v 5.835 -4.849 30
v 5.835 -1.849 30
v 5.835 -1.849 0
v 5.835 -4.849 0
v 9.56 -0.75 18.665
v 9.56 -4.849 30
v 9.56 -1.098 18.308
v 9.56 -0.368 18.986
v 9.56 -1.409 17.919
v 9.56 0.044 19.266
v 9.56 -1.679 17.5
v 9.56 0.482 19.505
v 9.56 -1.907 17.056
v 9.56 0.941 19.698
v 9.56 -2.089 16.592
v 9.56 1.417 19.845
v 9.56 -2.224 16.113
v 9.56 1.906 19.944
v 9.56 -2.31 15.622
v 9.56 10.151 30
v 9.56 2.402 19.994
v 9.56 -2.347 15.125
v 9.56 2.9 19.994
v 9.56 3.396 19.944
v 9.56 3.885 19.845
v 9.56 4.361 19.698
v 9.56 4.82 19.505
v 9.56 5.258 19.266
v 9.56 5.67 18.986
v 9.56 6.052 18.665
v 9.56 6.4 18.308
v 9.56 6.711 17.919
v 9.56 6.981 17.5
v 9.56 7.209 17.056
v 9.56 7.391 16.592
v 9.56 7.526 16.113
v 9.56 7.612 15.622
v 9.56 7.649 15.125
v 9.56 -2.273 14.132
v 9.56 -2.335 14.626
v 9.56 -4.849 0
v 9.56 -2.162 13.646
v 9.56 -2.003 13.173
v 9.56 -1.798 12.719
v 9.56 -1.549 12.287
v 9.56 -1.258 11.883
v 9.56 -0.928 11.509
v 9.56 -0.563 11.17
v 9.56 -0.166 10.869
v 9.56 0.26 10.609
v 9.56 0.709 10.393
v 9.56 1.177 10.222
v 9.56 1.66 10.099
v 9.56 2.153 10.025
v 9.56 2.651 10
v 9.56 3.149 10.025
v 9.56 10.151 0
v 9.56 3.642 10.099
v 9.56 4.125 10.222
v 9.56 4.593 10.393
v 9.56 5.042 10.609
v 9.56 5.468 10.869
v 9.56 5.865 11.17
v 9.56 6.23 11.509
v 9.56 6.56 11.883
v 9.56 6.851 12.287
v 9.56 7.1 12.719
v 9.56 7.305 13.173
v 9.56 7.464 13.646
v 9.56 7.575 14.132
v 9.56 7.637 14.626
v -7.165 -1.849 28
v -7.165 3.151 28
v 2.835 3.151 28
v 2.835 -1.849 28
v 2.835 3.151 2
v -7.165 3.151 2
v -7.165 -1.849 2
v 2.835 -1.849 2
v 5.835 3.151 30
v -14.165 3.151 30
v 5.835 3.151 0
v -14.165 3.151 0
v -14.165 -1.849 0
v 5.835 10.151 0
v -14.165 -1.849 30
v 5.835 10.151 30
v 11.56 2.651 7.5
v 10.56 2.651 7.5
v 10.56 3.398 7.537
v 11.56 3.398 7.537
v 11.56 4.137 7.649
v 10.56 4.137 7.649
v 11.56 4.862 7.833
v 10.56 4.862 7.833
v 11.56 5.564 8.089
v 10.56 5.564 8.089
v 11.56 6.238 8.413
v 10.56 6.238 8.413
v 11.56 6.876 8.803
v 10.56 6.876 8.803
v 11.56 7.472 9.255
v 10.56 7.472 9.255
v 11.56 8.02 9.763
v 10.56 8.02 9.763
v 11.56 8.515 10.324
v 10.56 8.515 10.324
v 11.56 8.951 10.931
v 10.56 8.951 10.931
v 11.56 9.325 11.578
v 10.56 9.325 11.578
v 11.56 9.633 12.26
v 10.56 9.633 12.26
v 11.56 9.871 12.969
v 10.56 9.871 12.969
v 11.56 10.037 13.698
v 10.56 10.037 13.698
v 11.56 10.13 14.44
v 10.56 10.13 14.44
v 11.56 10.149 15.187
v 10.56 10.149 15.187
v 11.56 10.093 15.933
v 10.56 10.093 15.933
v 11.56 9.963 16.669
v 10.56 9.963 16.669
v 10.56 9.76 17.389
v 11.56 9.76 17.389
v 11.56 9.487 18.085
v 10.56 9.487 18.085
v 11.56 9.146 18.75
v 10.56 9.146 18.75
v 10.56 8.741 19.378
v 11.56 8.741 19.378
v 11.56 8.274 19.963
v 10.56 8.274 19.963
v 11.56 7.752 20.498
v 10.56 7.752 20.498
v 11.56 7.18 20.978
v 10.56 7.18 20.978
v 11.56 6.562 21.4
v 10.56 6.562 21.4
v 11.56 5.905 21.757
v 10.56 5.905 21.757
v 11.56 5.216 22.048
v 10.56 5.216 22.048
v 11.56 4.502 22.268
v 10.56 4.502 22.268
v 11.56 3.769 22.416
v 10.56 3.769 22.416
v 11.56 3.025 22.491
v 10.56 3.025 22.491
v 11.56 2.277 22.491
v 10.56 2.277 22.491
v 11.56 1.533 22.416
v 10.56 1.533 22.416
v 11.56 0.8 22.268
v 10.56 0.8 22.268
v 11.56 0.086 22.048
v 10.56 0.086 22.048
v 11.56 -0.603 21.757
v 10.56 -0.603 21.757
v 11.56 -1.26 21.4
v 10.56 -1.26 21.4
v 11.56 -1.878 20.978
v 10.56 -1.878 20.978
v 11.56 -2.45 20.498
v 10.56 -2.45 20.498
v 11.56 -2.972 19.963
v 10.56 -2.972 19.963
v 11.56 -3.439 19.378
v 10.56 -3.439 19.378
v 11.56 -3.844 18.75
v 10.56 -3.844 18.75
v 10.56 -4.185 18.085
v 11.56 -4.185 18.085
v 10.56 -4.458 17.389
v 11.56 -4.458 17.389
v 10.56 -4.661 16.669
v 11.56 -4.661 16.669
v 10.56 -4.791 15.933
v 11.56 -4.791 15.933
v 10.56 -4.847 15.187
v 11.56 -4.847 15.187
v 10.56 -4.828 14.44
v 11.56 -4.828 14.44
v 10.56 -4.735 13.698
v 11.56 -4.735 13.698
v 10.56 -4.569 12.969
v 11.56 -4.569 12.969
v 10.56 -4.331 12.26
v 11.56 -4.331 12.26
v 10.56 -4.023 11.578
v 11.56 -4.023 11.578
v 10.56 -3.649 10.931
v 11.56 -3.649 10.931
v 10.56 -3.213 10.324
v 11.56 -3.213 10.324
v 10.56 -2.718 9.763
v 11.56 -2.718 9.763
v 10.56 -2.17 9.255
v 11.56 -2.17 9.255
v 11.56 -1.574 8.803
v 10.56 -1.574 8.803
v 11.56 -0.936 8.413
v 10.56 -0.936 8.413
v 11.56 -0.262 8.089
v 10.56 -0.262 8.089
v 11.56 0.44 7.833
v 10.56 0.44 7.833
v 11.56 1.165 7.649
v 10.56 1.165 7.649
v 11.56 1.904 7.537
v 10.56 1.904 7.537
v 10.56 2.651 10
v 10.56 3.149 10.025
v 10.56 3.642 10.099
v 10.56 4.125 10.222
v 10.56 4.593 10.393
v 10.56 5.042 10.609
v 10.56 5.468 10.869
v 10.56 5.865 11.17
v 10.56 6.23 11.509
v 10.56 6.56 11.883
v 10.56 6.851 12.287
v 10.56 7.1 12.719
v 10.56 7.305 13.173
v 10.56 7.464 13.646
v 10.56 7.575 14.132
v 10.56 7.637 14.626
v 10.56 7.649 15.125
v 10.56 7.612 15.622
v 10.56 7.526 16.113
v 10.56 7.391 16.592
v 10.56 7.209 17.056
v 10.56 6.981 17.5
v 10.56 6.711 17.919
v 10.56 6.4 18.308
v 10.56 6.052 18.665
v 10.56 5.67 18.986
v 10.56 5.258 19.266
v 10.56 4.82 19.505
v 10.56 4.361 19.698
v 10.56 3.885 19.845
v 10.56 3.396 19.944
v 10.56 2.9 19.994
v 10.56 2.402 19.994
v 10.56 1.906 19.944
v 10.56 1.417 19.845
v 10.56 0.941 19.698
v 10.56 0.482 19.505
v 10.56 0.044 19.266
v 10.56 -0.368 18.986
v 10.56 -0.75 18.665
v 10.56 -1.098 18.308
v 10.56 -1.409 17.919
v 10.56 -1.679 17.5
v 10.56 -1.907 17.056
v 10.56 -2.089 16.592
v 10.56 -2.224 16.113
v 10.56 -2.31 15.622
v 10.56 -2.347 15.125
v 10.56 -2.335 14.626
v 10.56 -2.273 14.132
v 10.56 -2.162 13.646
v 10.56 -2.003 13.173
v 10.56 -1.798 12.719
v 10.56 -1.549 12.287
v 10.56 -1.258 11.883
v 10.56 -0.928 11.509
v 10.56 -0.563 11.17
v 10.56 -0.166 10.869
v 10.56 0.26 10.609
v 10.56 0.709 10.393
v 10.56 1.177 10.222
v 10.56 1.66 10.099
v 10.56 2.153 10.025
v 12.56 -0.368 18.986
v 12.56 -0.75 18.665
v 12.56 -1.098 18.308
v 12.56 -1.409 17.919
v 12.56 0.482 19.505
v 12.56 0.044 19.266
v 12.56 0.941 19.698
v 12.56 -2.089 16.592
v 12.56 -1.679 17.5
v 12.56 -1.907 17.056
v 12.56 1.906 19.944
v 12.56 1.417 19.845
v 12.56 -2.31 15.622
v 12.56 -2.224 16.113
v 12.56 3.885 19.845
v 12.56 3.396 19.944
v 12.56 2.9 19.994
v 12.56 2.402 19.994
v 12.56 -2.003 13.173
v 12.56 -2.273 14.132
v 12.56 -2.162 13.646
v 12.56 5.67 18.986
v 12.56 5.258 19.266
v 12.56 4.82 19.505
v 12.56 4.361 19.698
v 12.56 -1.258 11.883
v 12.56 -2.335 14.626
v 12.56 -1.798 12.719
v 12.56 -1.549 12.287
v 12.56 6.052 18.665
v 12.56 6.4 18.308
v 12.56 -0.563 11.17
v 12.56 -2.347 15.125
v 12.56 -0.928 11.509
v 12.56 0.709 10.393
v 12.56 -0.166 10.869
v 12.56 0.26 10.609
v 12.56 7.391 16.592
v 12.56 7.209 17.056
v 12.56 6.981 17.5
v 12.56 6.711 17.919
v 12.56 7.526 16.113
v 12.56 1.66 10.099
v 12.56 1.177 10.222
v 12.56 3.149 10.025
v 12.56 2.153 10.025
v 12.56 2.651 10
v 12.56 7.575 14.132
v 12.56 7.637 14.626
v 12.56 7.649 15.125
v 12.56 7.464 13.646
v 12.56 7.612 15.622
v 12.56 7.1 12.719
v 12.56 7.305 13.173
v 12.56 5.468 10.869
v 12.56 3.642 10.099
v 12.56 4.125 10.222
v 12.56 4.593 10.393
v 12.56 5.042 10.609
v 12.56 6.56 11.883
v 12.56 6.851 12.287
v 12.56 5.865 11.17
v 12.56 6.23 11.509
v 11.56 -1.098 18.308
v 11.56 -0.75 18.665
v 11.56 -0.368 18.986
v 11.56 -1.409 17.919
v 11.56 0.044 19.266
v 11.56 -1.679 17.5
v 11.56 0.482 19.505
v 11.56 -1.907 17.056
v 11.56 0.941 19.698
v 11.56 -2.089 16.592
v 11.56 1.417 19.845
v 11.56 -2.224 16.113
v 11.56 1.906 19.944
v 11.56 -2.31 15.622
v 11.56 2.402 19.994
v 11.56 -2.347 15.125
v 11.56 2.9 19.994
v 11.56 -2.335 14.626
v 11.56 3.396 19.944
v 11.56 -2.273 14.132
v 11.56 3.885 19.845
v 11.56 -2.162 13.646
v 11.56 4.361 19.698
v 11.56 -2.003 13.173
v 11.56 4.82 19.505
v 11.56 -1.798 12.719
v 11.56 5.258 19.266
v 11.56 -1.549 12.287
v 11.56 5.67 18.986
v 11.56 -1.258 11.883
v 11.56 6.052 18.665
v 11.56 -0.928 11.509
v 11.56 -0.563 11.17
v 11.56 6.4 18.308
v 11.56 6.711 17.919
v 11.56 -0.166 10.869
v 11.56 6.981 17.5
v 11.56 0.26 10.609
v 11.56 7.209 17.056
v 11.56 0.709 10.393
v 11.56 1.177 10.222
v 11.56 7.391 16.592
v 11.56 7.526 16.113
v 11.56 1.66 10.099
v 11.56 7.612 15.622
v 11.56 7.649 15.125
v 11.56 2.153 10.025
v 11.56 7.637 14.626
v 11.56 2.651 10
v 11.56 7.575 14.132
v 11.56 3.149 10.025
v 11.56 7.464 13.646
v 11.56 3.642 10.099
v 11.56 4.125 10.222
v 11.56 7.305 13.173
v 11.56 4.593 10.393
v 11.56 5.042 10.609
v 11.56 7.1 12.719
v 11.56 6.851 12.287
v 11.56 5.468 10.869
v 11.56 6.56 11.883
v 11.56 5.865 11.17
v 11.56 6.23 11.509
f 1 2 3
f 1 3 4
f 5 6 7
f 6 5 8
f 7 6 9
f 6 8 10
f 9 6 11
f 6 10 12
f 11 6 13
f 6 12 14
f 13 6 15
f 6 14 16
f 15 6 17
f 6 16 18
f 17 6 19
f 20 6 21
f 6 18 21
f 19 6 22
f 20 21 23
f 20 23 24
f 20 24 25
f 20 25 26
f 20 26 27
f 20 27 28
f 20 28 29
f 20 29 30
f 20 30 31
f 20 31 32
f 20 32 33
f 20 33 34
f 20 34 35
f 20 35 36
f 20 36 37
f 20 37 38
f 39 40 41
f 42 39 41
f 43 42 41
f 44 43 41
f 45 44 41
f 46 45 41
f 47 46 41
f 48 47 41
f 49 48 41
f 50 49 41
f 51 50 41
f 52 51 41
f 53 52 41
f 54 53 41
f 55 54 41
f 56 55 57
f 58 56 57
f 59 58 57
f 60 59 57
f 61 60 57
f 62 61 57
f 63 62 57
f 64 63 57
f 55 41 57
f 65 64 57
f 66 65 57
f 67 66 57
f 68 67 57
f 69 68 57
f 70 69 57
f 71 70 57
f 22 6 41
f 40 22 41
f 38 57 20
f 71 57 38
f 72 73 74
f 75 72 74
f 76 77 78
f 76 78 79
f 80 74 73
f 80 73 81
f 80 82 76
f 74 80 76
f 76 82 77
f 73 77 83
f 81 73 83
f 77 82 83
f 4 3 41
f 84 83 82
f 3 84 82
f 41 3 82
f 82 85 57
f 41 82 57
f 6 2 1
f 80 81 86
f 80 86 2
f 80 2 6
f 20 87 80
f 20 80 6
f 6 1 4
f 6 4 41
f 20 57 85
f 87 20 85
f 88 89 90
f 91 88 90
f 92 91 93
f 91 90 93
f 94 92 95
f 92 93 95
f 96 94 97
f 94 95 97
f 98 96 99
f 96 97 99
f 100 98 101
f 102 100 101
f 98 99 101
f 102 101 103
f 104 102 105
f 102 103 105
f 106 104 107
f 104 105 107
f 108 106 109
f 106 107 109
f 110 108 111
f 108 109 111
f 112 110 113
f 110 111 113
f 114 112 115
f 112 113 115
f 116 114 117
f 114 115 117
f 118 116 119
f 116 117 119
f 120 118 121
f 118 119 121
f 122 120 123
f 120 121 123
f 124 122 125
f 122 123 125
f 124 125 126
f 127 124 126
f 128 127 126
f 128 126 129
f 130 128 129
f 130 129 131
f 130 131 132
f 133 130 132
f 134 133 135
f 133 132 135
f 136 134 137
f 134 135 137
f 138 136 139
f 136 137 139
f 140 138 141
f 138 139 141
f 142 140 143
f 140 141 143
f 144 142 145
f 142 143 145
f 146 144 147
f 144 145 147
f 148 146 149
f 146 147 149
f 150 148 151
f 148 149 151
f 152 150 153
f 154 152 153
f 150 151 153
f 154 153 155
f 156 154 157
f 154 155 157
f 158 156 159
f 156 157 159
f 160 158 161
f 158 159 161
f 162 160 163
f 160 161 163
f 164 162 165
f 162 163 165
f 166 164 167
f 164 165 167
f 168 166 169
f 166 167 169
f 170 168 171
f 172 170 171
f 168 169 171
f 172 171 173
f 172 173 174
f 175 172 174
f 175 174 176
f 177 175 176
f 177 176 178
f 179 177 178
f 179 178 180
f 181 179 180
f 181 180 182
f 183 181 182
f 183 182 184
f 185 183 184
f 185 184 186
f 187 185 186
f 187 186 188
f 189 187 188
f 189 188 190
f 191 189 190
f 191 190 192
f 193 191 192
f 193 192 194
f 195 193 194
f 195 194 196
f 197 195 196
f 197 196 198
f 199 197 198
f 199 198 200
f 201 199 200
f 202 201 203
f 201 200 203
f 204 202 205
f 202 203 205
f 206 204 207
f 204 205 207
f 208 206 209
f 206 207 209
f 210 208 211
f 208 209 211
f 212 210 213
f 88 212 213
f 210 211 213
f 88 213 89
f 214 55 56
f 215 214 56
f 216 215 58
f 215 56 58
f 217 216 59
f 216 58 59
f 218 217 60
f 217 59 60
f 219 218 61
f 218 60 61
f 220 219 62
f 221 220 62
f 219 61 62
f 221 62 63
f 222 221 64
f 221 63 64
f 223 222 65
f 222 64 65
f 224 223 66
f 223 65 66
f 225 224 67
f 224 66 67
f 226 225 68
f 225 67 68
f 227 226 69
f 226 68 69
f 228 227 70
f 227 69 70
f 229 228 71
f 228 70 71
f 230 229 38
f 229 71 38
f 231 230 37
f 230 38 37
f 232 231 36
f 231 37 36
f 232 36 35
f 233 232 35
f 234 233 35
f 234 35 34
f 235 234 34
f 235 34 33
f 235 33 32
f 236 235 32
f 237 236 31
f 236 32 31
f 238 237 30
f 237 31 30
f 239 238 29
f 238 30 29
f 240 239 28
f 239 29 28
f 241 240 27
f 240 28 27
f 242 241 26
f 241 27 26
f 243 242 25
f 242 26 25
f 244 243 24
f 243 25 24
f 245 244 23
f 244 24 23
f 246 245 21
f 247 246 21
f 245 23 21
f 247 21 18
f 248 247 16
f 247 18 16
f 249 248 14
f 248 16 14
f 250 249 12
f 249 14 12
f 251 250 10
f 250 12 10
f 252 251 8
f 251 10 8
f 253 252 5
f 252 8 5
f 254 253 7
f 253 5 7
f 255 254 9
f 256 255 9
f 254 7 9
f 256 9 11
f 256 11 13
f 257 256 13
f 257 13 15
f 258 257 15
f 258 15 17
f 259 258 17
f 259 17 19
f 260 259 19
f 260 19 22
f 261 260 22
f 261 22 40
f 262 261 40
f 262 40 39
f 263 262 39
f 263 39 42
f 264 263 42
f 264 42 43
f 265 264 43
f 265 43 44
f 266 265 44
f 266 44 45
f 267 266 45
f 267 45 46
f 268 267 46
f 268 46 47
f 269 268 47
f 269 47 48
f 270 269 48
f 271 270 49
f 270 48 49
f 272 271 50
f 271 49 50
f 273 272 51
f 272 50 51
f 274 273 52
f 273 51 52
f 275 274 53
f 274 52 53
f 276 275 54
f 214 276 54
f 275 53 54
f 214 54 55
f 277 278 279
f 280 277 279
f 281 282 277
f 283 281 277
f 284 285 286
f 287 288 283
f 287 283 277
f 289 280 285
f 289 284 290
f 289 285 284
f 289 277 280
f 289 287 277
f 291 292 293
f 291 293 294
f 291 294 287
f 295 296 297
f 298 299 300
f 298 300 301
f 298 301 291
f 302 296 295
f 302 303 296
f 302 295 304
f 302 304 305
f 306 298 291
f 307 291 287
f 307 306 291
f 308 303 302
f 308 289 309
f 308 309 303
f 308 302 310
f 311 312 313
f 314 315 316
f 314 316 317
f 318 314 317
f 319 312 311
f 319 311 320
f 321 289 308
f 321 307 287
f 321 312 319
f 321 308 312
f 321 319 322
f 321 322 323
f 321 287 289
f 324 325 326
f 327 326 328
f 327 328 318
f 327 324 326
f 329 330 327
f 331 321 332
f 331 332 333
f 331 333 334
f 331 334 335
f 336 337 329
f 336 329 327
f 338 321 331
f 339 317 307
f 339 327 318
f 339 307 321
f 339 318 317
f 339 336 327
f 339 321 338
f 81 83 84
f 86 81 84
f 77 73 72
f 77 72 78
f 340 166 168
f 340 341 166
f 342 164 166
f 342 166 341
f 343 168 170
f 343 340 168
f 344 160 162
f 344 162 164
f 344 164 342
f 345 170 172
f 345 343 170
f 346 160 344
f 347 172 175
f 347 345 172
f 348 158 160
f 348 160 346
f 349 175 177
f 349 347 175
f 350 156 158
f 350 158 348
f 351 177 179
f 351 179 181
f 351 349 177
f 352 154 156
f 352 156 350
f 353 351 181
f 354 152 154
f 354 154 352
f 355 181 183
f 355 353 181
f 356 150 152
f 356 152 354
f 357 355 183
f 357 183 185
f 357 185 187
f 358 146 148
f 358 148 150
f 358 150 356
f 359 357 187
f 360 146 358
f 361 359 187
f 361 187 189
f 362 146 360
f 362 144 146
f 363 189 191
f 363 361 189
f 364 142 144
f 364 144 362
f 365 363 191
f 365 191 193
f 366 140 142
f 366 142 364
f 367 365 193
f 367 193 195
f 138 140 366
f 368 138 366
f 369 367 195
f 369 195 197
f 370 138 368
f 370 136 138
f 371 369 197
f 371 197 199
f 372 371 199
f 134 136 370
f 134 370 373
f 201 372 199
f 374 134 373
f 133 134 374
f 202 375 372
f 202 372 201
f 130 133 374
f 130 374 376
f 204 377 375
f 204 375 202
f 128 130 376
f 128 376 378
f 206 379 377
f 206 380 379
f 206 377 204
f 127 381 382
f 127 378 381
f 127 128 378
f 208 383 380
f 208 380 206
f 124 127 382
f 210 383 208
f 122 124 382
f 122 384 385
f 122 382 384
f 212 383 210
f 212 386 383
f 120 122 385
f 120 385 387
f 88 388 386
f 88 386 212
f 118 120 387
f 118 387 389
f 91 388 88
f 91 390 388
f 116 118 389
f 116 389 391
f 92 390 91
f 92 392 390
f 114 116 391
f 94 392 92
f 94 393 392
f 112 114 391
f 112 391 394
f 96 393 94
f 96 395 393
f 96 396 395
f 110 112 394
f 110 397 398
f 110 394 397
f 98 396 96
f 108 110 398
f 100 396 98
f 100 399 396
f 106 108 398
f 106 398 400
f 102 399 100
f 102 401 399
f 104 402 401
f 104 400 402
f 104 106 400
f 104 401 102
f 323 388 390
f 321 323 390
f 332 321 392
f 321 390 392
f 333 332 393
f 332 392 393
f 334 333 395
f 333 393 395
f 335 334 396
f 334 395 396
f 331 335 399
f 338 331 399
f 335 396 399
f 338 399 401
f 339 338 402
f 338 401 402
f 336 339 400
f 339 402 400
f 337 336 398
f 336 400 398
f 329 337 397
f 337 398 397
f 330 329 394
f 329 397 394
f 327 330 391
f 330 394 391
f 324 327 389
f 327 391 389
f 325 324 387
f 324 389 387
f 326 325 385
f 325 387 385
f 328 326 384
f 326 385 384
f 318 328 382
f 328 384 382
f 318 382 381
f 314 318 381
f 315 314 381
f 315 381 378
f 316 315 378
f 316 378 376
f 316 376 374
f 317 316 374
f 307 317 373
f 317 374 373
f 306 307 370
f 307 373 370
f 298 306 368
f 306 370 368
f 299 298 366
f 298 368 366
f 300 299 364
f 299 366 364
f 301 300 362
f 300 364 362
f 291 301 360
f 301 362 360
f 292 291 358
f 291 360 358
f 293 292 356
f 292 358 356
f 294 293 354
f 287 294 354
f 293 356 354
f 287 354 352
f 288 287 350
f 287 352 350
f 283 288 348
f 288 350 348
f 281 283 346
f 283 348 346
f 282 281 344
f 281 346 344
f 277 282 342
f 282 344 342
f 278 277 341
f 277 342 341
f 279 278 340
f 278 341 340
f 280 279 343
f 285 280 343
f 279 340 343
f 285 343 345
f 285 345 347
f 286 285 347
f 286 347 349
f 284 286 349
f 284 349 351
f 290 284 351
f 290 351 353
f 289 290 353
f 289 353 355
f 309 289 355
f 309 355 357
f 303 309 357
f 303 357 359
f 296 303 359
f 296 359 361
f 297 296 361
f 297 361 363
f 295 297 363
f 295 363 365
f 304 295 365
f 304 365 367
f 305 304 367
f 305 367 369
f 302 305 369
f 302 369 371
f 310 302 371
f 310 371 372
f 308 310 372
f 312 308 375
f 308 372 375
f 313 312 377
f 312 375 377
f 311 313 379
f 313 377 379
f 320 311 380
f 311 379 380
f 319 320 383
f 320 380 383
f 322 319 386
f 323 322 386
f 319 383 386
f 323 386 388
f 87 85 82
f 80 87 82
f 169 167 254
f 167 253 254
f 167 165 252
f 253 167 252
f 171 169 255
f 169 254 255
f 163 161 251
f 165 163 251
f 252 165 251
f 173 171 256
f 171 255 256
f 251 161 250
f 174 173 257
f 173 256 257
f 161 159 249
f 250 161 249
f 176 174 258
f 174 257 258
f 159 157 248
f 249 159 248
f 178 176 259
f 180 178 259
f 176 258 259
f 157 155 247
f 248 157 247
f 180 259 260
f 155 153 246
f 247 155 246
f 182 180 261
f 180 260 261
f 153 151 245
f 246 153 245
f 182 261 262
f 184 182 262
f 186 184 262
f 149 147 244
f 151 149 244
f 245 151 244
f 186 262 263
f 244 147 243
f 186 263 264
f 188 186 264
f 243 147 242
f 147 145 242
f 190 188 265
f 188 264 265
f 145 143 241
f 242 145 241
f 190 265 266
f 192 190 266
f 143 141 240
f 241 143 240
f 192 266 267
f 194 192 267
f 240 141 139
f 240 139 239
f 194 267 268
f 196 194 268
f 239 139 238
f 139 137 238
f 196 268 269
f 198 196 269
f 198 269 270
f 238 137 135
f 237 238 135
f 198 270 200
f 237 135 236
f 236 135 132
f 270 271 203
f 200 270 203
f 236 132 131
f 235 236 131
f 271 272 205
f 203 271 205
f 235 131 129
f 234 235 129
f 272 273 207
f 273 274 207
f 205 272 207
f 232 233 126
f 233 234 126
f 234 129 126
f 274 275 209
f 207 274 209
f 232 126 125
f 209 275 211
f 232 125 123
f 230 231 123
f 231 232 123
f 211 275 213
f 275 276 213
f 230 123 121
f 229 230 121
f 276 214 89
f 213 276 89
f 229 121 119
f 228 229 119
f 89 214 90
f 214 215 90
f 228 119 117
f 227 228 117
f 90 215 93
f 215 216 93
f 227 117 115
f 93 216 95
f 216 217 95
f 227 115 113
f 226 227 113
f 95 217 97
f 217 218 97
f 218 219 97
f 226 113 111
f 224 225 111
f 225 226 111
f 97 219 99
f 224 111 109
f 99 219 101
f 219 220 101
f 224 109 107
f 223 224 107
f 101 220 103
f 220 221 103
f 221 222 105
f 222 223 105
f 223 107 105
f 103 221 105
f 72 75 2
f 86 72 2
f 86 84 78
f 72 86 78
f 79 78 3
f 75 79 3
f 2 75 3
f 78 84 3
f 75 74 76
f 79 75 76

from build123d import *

# Parameters (mm, degrees)
BOSS_EXTRUDE1_DEPTH = 30
SKETCH3_W           = 10
SKETCH3_H           = 26
CUT_EXTRUDE1_DEPTH  = 5
SKETCH6_R           = 5
BOSS_EXTRUDE2_DEPTH = 1
SKETCH7_R           = 7.5
BOSS_EXTRUDE3_DEPTH = 1
SKETCH8_R           = 5
BOSS_EXTRUDE4_DEPTH = 1


with BuildPart() as part:
    # Sketch1 → Boss-Extrude1 (new body)
    with BuildSketch(Plane.XY):
        Polygon((-14.164814983, 3.151006711), (-14.164814983, -1.848993289), (5.835185017, -1.848993289), (5.835185017, -4.848993289), (9.560017232, -4.848993289), (9.560017232, 10.151006711), (5.835185017, 10.151006711), (5.835185017, 3.151006711), align=None)
    extrude(amount=BOSS_EXTRUDE1_DEPTH)

    # Sketch3 → Cut-Extrude1 (cut)
    with BuildSketch(Plane(origin=(0, 3.151006711, 0), x_dir=(1, 0, 0), z_dir=(0, 1, 0))):
        with Locations((-2.164814983, -15)):
            Rectangle(SKETCH3_W, SKETCH3_H)
    extrude(amount=-CUT_EXTRUDE1_DEPTH, mode=Mode.SUBTRACT)

    # Sketch6 → Boss-Extrude2 (add)
    with BuildSketch(Plane(origin=(9.560017232, 0, 0), x_dir=(0, 0, -1), z_dir=(1, 0, 0))):
        with Locations((-15, 2.651006711)):
            Circle(SKETCH6_R)
    extrude(amount=BOSS_EXTRUDE2_DEPTH)

    # Sketch7 → Boss-Extrude3 (add)
    with BuildSketch(Plane(origin=(10.560017232, 0, 0), x_dir=(0, 0, -1), z_dir=(1, 0, 0))):
        with Locations((-15, 2.651006711)):
            Circle(SKETCH7_R)
    extrude(amount=BOSS_EXTRUDE3_DEPTH)

    # Sketch8 → Boss-Extrude4 (add)
    with BuildSketch(Plane(origin=(11.560017232, 0, 0), x_dir=(0, 0, -1), z_dir=(1, 0, 0))):
        with Locations((-15, 2.651006711)):
            Circle(SKETCH8_R)
    extrude(amount=BOSS_EXTRUDE4_DEPTH)


solid = part.part
